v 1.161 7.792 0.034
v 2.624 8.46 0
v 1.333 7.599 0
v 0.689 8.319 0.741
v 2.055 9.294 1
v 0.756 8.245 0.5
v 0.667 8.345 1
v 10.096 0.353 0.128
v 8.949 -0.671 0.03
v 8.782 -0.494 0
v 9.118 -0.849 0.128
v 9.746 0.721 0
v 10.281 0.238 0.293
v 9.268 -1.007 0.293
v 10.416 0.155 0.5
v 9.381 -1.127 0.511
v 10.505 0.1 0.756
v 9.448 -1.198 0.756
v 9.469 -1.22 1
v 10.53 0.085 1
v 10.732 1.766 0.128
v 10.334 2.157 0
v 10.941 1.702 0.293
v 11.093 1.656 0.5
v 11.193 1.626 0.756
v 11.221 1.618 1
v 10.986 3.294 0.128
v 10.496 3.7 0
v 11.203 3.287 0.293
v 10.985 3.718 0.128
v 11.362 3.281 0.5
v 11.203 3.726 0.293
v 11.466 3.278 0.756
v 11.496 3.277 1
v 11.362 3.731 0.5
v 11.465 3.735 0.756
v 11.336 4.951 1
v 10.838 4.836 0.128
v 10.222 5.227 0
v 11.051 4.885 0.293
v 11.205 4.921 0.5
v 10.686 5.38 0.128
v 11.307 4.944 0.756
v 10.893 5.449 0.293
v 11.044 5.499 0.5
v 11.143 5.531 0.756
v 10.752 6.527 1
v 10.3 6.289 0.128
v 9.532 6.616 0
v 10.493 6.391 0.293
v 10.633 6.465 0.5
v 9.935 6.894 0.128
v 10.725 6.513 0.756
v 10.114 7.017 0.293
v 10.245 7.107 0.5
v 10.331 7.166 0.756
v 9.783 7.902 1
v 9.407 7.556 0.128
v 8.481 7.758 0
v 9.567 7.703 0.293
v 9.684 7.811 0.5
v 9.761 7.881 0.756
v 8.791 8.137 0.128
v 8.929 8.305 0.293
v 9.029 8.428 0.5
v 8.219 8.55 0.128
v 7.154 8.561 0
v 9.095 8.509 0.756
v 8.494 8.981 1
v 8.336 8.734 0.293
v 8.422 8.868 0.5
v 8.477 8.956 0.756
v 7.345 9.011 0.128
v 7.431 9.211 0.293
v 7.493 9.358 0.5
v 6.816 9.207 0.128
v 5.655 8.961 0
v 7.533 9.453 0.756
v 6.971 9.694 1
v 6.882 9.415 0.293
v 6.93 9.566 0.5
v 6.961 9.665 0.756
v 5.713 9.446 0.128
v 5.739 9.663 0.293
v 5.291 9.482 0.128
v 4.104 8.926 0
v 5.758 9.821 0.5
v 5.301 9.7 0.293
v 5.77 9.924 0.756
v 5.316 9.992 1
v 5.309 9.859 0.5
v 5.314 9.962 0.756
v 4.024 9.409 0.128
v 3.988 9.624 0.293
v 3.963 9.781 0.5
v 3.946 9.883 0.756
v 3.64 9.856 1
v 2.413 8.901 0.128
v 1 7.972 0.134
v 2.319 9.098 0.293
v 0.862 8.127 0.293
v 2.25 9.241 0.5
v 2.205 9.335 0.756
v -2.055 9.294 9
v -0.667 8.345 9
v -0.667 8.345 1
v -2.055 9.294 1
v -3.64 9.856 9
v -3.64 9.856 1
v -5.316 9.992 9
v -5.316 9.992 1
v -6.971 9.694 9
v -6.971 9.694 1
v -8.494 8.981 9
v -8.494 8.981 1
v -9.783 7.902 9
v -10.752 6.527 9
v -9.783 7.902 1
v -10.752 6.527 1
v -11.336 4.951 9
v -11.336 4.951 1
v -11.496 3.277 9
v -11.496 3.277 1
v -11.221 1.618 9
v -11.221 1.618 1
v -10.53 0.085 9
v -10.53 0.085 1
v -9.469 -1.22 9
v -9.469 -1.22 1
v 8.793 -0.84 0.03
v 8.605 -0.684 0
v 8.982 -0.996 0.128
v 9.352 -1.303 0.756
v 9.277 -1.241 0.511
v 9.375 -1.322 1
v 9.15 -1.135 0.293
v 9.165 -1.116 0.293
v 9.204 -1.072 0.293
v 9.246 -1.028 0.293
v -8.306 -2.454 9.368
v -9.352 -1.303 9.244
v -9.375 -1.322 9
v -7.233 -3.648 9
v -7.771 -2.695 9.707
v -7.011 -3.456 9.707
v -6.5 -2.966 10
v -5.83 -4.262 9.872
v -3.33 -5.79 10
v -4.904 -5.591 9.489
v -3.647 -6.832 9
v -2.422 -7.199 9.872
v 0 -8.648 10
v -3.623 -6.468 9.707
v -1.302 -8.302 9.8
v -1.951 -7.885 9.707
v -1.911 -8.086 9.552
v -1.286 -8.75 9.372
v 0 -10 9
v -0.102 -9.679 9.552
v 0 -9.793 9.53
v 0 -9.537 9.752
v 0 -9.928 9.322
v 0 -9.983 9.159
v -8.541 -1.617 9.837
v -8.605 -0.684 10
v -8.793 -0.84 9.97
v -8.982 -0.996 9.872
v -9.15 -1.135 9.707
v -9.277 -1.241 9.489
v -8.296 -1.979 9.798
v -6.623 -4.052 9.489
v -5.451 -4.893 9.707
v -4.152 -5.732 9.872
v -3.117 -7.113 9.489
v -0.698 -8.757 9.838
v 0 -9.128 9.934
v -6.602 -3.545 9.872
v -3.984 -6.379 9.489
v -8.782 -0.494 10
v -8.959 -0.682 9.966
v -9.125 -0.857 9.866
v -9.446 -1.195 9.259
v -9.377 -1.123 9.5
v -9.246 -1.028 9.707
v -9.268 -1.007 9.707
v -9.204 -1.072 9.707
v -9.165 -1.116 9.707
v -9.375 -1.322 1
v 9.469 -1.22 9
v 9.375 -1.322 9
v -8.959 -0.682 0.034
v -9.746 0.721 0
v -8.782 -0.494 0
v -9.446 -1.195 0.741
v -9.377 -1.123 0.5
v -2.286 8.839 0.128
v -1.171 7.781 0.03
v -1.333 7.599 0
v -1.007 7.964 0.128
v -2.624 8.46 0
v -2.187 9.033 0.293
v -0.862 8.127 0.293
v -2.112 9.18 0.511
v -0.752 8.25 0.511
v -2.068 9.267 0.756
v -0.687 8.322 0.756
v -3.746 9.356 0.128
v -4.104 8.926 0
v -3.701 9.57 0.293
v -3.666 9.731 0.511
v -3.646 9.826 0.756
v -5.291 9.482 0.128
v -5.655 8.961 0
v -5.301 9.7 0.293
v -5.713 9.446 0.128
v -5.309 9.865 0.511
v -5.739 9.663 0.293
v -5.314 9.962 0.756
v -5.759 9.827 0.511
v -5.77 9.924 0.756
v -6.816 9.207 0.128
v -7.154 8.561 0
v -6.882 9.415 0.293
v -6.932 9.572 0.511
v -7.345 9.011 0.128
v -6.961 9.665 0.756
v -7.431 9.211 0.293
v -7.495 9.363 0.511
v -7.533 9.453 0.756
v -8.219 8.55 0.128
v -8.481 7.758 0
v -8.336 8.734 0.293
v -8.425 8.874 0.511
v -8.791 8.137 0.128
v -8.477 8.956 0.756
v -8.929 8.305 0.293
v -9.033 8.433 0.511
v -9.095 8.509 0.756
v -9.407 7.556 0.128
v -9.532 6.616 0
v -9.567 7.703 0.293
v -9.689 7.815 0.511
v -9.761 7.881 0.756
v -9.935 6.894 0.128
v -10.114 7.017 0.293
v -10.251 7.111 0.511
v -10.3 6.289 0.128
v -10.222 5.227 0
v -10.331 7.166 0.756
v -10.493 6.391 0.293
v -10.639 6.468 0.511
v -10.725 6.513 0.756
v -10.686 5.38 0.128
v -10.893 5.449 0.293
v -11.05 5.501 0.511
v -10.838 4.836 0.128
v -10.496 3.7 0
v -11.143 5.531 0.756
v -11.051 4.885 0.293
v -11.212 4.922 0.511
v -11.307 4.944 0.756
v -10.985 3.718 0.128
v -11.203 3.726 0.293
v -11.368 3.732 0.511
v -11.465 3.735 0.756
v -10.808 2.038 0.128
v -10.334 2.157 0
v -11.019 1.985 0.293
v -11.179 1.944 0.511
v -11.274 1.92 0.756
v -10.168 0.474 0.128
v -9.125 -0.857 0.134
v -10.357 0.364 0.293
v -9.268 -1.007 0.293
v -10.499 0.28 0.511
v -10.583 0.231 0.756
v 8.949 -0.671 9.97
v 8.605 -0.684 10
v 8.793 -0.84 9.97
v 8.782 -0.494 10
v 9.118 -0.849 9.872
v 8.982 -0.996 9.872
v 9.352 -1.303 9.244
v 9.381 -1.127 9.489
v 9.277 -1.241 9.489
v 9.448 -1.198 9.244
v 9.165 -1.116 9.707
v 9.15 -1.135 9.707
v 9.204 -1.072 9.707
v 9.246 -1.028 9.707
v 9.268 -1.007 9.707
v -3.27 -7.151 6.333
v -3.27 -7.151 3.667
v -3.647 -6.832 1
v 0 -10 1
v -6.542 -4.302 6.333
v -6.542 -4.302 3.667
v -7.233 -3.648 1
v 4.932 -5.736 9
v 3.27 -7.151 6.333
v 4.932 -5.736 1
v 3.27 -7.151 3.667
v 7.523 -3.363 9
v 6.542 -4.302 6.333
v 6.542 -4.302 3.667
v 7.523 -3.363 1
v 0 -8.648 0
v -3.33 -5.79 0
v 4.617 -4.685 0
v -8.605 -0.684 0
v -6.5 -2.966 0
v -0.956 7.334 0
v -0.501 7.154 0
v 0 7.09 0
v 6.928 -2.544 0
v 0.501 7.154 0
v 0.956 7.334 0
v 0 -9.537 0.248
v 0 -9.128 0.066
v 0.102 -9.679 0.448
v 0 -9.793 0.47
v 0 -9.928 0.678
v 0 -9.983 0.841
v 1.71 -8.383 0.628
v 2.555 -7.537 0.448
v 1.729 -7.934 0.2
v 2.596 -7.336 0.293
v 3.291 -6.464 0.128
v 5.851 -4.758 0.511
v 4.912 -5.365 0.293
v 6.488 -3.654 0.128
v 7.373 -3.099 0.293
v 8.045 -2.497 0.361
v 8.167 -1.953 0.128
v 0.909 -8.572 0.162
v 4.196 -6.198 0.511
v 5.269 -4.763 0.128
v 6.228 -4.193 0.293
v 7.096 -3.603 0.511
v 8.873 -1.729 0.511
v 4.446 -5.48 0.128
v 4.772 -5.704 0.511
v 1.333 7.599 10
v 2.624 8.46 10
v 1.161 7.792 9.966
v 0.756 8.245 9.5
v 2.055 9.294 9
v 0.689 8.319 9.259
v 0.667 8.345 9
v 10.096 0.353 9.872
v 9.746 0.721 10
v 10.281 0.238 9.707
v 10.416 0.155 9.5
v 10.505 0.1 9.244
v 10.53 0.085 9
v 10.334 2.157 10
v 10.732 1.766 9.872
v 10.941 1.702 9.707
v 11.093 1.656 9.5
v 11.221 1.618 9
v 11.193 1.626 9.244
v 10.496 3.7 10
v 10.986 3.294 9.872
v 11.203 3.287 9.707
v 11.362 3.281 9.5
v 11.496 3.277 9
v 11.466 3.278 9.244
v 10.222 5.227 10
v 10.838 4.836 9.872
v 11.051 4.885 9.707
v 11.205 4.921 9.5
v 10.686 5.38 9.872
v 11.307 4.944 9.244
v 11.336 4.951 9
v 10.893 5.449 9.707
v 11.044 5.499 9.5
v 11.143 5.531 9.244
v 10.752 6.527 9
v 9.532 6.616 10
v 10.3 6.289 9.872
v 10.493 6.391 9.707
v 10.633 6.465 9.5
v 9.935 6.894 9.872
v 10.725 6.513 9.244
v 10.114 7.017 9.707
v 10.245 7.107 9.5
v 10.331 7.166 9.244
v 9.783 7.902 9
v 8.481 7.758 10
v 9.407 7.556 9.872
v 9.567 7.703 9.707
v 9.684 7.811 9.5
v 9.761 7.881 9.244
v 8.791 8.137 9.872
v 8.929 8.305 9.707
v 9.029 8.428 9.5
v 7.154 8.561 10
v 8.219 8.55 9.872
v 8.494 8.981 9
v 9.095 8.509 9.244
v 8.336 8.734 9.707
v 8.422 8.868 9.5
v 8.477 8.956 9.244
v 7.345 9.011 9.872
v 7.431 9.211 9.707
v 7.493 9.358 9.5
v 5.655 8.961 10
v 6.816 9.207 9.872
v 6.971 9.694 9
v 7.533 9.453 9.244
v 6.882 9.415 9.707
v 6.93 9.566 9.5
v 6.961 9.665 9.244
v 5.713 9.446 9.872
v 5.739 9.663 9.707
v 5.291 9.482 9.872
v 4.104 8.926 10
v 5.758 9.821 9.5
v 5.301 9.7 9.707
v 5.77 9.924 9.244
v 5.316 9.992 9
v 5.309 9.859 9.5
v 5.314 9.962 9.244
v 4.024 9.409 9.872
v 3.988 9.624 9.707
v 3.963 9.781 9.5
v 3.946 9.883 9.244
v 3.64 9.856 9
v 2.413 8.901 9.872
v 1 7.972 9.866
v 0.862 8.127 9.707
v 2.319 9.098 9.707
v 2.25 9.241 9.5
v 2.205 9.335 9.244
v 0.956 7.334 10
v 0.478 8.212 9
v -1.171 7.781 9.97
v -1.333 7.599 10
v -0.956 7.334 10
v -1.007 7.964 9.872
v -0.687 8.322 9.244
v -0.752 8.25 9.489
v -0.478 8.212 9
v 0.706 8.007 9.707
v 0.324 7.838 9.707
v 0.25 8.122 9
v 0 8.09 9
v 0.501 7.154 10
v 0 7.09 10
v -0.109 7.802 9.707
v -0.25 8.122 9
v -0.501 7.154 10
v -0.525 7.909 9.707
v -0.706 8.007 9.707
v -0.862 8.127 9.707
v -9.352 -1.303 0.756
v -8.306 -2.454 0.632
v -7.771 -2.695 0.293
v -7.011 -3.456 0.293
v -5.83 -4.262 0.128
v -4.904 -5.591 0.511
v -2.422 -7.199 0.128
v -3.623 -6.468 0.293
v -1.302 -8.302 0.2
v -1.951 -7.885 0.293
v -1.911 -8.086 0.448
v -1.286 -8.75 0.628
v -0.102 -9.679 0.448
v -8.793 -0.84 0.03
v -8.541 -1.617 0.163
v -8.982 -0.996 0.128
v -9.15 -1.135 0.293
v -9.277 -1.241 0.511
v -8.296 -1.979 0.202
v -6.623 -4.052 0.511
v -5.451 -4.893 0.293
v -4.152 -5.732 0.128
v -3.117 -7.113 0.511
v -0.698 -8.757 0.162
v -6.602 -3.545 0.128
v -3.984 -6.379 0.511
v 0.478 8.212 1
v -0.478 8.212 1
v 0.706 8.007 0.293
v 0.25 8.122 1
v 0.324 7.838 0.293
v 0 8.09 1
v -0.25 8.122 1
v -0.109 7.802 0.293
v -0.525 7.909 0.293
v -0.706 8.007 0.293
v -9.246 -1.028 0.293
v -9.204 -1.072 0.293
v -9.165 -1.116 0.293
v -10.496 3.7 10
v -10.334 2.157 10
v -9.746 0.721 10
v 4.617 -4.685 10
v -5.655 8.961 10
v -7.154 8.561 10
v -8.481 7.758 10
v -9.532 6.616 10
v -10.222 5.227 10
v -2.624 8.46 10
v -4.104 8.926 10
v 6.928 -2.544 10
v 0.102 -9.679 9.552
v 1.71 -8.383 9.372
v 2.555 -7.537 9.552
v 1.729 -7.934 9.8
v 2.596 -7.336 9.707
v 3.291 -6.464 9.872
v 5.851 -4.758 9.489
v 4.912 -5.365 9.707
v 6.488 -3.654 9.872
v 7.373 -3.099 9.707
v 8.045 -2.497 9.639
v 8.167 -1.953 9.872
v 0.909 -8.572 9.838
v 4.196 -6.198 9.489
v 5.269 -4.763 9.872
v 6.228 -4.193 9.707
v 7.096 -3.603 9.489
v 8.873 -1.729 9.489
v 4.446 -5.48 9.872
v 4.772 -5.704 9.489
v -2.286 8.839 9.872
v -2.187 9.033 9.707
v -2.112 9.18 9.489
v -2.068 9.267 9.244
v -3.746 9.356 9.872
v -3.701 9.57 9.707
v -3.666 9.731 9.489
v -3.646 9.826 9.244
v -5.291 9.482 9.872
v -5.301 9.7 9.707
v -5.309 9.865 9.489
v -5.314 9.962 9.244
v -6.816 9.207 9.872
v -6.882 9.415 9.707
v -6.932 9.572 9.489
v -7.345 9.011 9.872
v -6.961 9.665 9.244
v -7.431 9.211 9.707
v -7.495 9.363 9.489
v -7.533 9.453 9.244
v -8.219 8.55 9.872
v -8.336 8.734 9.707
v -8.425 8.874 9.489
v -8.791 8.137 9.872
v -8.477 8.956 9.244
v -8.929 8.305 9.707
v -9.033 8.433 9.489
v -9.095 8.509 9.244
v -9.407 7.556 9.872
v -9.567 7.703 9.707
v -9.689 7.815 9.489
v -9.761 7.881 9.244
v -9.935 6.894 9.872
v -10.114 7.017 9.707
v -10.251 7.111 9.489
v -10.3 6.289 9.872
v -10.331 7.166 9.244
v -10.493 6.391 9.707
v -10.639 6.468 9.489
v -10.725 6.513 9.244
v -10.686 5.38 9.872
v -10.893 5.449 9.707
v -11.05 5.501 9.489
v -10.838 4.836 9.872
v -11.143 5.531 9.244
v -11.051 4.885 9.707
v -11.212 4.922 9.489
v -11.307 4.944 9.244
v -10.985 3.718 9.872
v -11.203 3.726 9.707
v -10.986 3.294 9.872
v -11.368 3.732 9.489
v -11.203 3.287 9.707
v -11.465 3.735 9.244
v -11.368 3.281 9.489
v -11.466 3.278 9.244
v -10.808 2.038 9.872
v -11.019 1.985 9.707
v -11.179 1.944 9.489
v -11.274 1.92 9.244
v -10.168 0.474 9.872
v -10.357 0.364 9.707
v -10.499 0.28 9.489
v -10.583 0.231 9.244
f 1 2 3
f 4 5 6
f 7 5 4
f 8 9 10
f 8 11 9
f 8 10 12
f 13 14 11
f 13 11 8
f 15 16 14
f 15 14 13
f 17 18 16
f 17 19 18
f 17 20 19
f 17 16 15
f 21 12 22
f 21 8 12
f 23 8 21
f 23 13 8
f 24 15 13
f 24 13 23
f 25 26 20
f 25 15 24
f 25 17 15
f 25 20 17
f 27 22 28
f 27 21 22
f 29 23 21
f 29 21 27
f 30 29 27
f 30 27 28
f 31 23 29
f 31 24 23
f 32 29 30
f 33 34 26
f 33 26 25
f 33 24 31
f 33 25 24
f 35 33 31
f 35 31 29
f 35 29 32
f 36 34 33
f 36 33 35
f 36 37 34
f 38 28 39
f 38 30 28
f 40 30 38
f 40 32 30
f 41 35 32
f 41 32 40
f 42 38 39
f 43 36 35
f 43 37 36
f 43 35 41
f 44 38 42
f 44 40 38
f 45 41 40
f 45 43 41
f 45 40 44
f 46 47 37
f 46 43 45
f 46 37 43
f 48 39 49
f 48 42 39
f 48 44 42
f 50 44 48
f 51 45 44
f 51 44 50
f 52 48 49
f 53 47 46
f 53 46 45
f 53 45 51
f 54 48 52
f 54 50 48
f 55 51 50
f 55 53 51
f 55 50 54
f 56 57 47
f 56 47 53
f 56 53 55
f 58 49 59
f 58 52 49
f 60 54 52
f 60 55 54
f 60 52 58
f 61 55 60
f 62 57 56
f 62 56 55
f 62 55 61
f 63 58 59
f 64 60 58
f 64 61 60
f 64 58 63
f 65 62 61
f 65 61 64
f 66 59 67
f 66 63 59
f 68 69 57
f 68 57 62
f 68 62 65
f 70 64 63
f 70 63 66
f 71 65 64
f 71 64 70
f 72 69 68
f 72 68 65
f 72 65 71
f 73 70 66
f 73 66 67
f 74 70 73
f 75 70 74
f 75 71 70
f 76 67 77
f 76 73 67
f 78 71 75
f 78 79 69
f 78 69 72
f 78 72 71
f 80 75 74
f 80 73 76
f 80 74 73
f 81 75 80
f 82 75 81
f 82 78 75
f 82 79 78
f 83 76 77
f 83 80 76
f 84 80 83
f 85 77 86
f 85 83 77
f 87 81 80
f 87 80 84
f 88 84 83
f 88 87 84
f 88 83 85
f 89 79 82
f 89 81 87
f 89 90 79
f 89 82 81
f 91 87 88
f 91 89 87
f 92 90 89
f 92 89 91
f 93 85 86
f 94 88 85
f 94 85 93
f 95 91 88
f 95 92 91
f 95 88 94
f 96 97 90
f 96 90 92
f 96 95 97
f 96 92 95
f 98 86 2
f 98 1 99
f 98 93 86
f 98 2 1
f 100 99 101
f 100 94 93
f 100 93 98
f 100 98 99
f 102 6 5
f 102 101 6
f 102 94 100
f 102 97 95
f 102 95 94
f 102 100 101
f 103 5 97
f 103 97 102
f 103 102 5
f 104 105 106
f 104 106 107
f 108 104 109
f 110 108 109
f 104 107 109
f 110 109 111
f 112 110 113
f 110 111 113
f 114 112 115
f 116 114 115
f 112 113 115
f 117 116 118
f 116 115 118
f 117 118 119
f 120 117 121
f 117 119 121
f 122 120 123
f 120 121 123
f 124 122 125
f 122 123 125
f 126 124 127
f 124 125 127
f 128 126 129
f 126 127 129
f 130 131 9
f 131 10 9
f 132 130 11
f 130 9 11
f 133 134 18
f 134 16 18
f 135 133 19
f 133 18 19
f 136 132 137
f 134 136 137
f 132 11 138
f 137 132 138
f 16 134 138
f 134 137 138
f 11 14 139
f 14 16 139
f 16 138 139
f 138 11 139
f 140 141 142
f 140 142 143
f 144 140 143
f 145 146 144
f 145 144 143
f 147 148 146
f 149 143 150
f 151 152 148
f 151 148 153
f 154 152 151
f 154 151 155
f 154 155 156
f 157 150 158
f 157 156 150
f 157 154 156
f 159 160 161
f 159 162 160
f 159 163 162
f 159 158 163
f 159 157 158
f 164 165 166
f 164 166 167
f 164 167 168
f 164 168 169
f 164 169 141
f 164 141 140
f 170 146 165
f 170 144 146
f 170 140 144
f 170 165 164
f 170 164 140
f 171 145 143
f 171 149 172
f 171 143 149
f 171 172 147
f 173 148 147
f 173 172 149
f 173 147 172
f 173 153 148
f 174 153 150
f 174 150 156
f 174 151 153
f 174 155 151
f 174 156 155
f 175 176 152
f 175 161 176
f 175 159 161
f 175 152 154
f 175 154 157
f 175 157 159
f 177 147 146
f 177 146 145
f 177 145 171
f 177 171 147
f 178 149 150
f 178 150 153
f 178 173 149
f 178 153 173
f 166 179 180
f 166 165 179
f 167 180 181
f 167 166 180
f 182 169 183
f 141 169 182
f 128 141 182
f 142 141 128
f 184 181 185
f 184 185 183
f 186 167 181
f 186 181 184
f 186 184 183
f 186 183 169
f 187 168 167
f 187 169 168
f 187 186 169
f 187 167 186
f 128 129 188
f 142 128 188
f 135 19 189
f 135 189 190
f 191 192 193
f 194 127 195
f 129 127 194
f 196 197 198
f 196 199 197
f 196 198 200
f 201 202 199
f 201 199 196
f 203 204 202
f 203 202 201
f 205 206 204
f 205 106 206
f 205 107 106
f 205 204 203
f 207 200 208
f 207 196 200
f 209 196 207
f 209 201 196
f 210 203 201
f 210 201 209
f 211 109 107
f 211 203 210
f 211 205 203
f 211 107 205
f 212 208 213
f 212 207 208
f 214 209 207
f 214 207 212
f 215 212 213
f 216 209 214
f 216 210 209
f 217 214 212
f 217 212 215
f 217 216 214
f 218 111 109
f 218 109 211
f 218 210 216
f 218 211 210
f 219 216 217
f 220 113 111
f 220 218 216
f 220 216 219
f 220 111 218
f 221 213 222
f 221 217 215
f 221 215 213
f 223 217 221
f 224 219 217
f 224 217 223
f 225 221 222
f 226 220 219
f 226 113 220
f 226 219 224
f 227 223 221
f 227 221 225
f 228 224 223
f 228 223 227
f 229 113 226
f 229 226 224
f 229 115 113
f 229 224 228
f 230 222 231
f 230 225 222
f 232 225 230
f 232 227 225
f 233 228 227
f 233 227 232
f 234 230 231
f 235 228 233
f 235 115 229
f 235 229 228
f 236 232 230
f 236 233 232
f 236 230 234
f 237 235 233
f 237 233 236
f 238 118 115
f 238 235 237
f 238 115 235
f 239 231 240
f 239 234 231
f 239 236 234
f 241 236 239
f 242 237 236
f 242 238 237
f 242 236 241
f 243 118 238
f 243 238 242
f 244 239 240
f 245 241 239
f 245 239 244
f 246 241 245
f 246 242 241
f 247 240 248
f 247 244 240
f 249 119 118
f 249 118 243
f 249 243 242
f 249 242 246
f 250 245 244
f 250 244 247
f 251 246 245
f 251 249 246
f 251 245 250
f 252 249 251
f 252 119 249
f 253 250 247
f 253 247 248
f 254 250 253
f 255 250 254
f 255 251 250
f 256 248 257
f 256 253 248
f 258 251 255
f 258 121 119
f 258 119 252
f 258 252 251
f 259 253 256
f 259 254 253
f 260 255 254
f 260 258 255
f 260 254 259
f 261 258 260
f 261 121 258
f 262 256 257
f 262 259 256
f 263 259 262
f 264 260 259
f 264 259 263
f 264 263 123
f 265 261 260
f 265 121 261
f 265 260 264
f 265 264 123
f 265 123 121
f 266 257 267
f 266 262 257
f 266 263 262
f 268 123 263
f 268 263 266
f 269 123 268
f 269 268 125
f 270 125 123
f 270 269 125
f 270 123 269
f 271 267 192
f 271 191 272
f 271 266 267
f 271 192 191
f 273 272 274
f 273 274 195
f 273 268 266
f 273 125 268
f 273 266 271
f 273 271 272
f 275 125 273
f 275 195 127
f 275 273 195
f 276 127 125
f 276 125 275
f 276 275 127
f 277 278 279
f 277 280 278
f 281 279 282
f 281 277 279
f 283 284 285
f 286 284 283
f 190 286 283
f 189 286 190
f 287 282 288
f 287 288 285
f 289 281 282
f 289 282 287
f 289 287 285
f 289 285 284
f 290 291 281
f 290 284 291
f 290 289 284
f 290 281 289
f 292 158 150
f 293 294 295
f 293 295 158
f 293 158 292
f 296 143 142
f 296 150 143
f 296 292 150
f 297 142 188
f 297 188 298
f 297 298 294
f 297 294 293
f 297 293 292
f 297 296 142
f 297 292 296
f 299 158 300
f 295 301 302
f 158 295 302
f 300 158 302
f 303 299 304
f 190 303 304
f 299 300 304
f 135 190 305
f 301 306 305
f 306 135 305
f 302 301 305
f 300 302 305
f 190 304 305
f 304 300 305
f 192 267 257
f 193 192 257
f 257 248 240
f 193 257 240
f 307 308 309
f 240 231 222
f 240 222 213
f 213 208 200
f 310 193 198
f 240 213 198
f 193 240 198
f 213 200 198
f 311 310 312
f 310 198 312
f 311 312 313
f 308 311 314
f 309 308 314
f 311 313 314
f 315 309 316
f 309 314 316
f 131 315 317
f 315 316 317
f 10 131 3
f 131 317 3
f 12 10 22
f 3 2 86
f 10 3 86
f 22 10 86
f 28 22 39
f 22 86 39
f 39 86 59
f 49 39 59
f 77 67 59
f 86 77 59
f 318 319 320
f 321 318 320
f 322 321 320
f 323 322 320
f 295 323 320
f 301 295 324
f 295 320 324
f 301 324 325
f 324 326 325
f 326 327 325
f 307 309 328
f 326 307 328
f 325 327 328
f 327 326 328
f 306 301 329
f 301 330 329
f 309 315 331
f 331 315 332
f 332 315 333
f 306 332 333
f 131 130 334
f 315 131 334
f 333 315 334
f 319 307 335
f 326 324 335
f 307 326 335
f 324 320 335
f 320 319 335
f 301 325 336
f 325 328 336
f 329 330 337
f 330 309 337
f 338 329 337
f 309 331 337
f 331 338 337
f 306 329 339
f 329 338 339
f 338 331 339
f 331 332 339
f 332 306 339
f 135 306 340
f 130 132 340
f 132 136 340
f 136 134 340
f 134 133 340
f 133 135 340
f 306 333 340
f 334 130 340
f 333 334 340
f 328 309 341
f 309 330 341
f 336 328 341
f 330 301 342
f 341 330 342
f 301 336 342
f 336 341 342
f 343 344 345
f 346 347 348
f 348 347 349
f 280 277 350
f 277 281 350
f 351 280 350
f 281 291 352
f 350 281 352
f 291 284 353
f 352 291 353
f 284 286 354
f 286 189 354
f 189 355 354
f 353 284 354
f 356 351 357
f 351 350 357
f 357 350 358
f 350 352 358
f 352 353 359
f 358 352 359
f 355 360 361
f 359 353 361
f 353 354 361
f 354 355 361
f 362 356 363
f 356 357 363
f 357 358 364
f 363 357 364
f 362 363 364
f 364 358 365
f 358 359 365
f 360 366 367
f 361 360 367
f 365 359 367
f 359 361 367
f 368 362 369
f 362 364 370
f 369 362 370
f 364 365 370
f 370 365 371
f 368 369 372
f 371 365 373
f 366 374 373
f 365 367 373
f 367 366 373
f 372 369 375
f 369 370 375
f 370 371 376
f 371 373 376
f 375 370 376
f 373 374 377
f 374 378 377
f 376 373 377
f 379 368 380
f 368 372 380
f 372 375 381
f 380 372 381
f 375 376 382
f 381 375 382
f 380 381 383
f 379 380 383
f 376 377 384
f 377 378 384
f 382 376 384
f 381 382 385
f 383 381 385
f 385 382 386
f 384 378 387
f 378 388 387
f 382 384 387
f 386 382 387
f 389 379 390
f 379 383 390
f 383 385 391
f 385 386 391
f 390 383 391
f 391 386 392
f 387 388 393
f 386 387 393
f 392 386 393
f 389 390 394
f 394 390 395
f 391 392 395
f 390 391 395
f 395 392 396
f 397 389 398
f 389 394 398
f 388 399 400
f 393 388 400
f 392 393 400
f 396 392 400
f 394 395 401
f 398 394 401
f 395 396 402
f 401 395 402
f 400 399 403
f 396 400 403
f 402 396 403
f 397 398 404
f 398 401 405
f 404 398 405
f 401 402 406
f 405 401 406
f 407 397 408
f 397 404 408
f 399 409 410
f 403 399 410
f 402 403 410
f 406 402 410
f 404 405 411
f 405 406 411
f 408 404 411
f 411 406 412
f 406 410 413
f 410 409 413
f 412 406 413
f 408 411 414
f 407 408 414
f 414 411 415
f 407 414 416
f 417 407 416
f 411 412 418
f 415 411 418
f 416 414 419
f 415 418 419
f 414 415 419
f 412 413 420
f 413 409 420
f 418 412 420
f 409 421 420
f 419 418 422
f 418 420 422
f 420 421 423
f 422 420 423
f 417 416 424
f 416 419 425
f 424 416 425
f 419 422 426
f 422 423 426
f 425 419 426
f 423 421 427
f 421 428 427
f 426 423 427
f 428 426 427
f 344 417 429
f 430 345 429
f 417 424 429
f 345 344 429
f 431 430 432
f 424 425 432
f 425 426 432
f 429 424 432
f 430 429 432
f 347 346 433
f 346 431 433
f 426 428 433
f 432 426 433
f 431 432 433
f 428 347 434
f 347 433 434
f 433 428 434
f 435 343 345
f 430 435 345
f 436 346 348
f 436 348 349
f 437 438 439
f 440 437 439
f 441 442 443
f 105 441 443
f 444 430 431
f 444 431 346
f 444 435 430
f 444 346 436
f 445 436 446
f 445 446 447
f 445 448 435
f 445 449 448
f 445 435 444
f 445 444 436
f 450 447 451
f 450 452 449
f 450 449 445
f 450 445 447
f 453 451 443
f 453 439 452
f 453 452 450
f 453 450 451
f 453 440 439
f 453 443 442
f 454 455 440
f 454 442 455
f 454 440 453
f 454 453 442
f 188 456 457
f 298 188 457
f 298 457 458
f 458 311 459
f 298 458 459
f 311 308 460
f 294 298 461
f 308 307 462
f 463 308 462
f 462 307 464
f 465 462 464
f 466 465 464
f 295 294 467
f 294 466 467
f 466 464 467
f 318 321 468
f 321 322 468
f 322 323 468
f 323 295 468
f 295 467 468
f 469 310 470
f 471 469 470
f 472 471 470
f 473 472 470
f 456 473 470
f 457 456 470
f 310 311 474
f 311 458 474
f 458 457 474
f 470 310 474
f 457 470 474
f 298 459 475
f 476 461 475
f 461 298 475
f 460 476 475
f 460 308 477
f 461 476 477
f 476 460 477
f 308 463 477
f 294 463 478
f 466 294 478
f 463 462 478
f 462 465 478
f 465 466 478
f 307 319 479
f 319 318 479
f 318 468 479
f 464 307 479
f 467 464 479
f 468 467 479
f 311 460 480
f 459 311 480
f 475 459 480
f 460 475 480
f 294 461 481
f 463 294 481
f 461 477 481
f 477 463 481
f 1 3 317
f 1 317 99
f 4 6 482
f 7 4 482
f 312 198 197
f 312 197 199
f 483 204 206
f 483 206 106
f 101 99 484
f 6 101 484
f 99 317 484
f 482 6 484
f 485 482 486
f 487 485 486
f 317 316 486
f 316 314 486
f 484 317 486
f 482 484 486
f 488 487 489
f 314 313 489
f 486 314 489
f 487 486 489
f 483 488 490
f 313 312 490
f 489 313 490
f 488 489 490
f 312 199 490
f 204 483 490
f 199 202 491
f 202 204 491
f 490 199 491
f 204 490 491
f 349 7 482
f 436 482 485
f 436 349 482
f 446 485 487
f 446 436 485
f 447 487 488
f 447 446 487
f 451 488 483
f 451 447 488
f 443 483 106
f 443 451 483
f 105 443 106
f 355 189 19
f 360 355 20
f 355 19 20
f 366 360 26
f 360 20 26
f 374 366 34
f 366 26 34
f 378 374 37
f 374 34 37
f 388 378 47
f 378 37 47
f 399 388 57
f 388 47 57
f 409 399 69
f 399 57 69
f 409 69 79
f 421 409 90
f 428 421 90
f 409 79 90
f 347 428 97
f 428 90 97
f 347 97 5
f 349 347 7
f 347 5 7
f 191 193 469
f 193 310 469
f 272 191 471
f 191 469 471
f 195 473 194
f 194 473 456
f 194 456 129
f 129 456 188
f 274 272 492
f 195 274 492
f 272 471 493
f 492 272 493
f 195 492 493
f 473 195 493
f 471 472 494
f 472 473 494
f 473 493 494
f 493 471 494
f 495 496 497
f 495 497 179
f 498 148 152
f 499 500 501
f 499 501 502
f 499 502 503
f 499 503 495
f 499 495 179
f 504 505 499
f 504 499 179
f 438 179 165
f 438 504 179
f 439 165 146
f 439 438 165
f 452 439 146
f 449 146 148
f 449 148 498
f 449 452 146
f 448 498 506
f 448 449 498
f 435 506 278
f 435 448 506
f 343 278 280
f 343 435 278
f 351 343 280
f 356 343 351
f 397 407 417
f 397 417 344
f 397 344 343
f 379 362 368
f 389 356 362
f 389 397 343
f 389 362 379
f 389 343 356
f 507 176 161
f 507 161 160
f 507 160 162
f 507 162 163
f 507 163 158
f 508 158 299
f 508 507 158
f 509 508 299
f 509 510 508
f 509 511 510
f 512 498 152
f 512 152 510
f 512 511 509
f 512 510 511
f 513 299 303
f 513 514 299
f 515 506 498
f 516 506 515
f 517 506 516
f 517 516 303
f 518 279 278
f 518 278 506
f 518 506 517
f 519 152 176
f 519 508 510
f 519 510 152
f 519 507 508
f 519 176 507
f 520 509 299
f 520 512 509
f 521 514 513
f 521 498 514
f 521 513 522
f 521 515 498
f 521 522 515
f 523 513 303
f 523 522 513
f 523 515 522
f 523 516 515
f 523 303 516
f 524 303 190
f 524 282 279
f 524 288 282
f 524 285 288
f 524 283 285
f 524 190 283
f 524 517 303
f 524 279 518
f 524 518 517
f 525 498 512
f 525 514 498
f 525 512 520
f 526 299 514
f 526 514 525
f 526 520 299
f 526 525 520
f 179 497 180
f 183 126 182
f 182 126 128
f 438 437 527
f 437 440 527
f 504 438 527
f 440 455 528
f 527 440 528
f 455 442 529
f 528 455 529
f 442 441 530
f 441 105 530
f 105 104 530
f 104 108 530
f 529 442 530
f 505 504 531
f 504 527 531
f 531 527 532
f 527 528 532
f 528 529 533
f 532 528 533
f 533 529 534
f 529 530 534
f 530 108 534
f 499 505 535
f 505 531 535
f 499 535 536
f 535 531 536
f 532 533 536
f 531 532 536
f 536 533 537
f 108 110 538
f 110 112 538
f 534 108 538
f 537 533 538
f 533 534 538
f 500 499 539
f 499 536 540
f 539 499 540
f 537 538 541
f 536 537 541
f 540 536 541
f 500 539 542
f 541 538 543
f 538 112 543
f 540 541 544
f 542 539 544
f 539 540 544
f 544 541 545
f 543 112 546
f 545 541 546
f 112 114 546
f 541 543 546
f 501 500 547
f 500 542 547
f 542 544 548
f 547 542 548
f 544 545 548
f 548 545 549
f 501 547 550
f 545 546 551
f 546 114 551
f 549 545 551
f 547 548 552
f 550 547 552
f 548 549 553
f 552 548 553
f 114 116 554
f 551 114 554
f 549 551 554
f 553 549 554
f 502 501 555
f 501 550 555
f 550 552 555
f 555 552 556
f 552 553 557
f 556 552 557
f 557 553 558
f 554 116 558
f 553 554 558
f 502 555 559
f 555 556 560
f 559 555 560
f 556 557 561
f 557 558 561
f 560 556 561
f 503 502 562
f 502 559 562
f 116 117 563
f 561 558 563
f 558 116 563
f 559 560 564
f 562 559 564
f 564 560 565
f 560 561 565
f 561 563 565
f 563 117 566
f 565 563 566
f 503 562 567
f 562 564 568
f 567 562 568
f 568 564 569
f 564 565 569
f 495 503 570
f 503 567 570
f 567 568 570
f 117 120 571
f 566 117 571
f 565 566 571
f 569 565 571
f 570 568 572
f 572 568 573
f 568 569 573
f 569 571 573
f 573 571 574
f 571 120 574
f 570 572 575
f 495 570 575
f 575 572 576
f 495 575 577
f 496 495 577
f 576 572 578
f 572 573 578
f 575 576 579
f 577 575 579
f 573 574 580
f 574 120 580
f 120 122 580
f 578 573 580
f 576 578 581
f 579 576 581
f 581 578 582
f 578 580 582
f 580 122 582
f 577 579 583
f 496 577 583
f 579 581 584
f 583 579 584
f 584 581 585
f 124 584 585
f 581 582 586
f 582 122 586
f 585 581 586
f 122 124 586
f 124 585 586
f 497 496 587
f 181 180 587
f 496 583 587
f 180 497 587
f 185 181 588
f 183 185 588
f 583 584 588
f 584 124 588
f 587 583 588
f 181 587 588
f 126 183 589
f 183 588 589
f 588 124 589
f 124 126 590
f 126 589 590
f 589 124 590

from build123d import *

# Parameters (mm, degrees)
F1_DEPTH = 10
F2_F1_R  = 1
F2_F2_R  = 1


with BuildPart() as f1:
    # F0 (on Top) → F1 (new body)
    with BuildSketch(Plane.XY):
        with BuildLine():
            ThreePointArc((9.4193928047, -1.2664417795), (9.4693151315, 8.2196633625), (0, 7.6533119315))
            ThreePointArc((0, 7.6533119315), (-9.4693151315, 8.2196633625), (-9.4193928047, -1.2664417795))
            add(Edge.make_bspline(
                [(0, -10), (-3.1397976016, -7.0888139265), (-6.9542042911, -4.3797008693), (-9.4193928047, -1.2664417795)],
                knots=[0, 0, 0, 0, 12.8452325787, 12.8452325787, 12.8452325787, 12.8452325787], degree=3))
            add(Edge.make_bspline(
                [(0, -10), (3.1397976016, -7.0888139265), (6.9542042911, -4.3797008693), (9.4193928047, -1.2664417795)],
                knots=[0, 0, 0, 0, 12.8452325787, 12.8452325787, 12.8452325787, 12.8452325787], degree=3))
        make_face()
    extrude(amount=F1_DEPTH)

    # F2: fillet of radius 1 on 7 edges, made by hand

    # F2_f1
    f2_f1_edges = [f1.edges().sort_by_distance(p)[0] for p in [
        (0, 7.6533119315, 5),
        (-9.4193928047, -1.2664417795, 5),
        (9.4193928047, -1.2664417795, 5),
    ]]
    fillet(f2_f1_edges, radius=F2_F1_R)

    # F2_f2
    f2_f2_edges = [f1.edges().sort_by_distance(p)[0] for p in [
        (-9.7828337858, 7.9016475299, 0),
        (-9.7828337858, 7.9016475299, 10),
        (9.7828337858, 7.9016475299, 0),
        (9.7828337858, 7.9016475299, 10),
        (9.4202986519, -1.2694012696, 10),
        (1e-10, 8.0901699416, 10),
        (9.4202986519, -1.2694012696, 0),
        (1e-10, 8.0901699416, 0),
        (-9.4202986519, -1.2694012696, 10),
        (-9.4202986519, -1.2694012696, 0),
    ]]
    fillet(f2_f2_edges, radius=F2_F2_R)


solid = f1.part
